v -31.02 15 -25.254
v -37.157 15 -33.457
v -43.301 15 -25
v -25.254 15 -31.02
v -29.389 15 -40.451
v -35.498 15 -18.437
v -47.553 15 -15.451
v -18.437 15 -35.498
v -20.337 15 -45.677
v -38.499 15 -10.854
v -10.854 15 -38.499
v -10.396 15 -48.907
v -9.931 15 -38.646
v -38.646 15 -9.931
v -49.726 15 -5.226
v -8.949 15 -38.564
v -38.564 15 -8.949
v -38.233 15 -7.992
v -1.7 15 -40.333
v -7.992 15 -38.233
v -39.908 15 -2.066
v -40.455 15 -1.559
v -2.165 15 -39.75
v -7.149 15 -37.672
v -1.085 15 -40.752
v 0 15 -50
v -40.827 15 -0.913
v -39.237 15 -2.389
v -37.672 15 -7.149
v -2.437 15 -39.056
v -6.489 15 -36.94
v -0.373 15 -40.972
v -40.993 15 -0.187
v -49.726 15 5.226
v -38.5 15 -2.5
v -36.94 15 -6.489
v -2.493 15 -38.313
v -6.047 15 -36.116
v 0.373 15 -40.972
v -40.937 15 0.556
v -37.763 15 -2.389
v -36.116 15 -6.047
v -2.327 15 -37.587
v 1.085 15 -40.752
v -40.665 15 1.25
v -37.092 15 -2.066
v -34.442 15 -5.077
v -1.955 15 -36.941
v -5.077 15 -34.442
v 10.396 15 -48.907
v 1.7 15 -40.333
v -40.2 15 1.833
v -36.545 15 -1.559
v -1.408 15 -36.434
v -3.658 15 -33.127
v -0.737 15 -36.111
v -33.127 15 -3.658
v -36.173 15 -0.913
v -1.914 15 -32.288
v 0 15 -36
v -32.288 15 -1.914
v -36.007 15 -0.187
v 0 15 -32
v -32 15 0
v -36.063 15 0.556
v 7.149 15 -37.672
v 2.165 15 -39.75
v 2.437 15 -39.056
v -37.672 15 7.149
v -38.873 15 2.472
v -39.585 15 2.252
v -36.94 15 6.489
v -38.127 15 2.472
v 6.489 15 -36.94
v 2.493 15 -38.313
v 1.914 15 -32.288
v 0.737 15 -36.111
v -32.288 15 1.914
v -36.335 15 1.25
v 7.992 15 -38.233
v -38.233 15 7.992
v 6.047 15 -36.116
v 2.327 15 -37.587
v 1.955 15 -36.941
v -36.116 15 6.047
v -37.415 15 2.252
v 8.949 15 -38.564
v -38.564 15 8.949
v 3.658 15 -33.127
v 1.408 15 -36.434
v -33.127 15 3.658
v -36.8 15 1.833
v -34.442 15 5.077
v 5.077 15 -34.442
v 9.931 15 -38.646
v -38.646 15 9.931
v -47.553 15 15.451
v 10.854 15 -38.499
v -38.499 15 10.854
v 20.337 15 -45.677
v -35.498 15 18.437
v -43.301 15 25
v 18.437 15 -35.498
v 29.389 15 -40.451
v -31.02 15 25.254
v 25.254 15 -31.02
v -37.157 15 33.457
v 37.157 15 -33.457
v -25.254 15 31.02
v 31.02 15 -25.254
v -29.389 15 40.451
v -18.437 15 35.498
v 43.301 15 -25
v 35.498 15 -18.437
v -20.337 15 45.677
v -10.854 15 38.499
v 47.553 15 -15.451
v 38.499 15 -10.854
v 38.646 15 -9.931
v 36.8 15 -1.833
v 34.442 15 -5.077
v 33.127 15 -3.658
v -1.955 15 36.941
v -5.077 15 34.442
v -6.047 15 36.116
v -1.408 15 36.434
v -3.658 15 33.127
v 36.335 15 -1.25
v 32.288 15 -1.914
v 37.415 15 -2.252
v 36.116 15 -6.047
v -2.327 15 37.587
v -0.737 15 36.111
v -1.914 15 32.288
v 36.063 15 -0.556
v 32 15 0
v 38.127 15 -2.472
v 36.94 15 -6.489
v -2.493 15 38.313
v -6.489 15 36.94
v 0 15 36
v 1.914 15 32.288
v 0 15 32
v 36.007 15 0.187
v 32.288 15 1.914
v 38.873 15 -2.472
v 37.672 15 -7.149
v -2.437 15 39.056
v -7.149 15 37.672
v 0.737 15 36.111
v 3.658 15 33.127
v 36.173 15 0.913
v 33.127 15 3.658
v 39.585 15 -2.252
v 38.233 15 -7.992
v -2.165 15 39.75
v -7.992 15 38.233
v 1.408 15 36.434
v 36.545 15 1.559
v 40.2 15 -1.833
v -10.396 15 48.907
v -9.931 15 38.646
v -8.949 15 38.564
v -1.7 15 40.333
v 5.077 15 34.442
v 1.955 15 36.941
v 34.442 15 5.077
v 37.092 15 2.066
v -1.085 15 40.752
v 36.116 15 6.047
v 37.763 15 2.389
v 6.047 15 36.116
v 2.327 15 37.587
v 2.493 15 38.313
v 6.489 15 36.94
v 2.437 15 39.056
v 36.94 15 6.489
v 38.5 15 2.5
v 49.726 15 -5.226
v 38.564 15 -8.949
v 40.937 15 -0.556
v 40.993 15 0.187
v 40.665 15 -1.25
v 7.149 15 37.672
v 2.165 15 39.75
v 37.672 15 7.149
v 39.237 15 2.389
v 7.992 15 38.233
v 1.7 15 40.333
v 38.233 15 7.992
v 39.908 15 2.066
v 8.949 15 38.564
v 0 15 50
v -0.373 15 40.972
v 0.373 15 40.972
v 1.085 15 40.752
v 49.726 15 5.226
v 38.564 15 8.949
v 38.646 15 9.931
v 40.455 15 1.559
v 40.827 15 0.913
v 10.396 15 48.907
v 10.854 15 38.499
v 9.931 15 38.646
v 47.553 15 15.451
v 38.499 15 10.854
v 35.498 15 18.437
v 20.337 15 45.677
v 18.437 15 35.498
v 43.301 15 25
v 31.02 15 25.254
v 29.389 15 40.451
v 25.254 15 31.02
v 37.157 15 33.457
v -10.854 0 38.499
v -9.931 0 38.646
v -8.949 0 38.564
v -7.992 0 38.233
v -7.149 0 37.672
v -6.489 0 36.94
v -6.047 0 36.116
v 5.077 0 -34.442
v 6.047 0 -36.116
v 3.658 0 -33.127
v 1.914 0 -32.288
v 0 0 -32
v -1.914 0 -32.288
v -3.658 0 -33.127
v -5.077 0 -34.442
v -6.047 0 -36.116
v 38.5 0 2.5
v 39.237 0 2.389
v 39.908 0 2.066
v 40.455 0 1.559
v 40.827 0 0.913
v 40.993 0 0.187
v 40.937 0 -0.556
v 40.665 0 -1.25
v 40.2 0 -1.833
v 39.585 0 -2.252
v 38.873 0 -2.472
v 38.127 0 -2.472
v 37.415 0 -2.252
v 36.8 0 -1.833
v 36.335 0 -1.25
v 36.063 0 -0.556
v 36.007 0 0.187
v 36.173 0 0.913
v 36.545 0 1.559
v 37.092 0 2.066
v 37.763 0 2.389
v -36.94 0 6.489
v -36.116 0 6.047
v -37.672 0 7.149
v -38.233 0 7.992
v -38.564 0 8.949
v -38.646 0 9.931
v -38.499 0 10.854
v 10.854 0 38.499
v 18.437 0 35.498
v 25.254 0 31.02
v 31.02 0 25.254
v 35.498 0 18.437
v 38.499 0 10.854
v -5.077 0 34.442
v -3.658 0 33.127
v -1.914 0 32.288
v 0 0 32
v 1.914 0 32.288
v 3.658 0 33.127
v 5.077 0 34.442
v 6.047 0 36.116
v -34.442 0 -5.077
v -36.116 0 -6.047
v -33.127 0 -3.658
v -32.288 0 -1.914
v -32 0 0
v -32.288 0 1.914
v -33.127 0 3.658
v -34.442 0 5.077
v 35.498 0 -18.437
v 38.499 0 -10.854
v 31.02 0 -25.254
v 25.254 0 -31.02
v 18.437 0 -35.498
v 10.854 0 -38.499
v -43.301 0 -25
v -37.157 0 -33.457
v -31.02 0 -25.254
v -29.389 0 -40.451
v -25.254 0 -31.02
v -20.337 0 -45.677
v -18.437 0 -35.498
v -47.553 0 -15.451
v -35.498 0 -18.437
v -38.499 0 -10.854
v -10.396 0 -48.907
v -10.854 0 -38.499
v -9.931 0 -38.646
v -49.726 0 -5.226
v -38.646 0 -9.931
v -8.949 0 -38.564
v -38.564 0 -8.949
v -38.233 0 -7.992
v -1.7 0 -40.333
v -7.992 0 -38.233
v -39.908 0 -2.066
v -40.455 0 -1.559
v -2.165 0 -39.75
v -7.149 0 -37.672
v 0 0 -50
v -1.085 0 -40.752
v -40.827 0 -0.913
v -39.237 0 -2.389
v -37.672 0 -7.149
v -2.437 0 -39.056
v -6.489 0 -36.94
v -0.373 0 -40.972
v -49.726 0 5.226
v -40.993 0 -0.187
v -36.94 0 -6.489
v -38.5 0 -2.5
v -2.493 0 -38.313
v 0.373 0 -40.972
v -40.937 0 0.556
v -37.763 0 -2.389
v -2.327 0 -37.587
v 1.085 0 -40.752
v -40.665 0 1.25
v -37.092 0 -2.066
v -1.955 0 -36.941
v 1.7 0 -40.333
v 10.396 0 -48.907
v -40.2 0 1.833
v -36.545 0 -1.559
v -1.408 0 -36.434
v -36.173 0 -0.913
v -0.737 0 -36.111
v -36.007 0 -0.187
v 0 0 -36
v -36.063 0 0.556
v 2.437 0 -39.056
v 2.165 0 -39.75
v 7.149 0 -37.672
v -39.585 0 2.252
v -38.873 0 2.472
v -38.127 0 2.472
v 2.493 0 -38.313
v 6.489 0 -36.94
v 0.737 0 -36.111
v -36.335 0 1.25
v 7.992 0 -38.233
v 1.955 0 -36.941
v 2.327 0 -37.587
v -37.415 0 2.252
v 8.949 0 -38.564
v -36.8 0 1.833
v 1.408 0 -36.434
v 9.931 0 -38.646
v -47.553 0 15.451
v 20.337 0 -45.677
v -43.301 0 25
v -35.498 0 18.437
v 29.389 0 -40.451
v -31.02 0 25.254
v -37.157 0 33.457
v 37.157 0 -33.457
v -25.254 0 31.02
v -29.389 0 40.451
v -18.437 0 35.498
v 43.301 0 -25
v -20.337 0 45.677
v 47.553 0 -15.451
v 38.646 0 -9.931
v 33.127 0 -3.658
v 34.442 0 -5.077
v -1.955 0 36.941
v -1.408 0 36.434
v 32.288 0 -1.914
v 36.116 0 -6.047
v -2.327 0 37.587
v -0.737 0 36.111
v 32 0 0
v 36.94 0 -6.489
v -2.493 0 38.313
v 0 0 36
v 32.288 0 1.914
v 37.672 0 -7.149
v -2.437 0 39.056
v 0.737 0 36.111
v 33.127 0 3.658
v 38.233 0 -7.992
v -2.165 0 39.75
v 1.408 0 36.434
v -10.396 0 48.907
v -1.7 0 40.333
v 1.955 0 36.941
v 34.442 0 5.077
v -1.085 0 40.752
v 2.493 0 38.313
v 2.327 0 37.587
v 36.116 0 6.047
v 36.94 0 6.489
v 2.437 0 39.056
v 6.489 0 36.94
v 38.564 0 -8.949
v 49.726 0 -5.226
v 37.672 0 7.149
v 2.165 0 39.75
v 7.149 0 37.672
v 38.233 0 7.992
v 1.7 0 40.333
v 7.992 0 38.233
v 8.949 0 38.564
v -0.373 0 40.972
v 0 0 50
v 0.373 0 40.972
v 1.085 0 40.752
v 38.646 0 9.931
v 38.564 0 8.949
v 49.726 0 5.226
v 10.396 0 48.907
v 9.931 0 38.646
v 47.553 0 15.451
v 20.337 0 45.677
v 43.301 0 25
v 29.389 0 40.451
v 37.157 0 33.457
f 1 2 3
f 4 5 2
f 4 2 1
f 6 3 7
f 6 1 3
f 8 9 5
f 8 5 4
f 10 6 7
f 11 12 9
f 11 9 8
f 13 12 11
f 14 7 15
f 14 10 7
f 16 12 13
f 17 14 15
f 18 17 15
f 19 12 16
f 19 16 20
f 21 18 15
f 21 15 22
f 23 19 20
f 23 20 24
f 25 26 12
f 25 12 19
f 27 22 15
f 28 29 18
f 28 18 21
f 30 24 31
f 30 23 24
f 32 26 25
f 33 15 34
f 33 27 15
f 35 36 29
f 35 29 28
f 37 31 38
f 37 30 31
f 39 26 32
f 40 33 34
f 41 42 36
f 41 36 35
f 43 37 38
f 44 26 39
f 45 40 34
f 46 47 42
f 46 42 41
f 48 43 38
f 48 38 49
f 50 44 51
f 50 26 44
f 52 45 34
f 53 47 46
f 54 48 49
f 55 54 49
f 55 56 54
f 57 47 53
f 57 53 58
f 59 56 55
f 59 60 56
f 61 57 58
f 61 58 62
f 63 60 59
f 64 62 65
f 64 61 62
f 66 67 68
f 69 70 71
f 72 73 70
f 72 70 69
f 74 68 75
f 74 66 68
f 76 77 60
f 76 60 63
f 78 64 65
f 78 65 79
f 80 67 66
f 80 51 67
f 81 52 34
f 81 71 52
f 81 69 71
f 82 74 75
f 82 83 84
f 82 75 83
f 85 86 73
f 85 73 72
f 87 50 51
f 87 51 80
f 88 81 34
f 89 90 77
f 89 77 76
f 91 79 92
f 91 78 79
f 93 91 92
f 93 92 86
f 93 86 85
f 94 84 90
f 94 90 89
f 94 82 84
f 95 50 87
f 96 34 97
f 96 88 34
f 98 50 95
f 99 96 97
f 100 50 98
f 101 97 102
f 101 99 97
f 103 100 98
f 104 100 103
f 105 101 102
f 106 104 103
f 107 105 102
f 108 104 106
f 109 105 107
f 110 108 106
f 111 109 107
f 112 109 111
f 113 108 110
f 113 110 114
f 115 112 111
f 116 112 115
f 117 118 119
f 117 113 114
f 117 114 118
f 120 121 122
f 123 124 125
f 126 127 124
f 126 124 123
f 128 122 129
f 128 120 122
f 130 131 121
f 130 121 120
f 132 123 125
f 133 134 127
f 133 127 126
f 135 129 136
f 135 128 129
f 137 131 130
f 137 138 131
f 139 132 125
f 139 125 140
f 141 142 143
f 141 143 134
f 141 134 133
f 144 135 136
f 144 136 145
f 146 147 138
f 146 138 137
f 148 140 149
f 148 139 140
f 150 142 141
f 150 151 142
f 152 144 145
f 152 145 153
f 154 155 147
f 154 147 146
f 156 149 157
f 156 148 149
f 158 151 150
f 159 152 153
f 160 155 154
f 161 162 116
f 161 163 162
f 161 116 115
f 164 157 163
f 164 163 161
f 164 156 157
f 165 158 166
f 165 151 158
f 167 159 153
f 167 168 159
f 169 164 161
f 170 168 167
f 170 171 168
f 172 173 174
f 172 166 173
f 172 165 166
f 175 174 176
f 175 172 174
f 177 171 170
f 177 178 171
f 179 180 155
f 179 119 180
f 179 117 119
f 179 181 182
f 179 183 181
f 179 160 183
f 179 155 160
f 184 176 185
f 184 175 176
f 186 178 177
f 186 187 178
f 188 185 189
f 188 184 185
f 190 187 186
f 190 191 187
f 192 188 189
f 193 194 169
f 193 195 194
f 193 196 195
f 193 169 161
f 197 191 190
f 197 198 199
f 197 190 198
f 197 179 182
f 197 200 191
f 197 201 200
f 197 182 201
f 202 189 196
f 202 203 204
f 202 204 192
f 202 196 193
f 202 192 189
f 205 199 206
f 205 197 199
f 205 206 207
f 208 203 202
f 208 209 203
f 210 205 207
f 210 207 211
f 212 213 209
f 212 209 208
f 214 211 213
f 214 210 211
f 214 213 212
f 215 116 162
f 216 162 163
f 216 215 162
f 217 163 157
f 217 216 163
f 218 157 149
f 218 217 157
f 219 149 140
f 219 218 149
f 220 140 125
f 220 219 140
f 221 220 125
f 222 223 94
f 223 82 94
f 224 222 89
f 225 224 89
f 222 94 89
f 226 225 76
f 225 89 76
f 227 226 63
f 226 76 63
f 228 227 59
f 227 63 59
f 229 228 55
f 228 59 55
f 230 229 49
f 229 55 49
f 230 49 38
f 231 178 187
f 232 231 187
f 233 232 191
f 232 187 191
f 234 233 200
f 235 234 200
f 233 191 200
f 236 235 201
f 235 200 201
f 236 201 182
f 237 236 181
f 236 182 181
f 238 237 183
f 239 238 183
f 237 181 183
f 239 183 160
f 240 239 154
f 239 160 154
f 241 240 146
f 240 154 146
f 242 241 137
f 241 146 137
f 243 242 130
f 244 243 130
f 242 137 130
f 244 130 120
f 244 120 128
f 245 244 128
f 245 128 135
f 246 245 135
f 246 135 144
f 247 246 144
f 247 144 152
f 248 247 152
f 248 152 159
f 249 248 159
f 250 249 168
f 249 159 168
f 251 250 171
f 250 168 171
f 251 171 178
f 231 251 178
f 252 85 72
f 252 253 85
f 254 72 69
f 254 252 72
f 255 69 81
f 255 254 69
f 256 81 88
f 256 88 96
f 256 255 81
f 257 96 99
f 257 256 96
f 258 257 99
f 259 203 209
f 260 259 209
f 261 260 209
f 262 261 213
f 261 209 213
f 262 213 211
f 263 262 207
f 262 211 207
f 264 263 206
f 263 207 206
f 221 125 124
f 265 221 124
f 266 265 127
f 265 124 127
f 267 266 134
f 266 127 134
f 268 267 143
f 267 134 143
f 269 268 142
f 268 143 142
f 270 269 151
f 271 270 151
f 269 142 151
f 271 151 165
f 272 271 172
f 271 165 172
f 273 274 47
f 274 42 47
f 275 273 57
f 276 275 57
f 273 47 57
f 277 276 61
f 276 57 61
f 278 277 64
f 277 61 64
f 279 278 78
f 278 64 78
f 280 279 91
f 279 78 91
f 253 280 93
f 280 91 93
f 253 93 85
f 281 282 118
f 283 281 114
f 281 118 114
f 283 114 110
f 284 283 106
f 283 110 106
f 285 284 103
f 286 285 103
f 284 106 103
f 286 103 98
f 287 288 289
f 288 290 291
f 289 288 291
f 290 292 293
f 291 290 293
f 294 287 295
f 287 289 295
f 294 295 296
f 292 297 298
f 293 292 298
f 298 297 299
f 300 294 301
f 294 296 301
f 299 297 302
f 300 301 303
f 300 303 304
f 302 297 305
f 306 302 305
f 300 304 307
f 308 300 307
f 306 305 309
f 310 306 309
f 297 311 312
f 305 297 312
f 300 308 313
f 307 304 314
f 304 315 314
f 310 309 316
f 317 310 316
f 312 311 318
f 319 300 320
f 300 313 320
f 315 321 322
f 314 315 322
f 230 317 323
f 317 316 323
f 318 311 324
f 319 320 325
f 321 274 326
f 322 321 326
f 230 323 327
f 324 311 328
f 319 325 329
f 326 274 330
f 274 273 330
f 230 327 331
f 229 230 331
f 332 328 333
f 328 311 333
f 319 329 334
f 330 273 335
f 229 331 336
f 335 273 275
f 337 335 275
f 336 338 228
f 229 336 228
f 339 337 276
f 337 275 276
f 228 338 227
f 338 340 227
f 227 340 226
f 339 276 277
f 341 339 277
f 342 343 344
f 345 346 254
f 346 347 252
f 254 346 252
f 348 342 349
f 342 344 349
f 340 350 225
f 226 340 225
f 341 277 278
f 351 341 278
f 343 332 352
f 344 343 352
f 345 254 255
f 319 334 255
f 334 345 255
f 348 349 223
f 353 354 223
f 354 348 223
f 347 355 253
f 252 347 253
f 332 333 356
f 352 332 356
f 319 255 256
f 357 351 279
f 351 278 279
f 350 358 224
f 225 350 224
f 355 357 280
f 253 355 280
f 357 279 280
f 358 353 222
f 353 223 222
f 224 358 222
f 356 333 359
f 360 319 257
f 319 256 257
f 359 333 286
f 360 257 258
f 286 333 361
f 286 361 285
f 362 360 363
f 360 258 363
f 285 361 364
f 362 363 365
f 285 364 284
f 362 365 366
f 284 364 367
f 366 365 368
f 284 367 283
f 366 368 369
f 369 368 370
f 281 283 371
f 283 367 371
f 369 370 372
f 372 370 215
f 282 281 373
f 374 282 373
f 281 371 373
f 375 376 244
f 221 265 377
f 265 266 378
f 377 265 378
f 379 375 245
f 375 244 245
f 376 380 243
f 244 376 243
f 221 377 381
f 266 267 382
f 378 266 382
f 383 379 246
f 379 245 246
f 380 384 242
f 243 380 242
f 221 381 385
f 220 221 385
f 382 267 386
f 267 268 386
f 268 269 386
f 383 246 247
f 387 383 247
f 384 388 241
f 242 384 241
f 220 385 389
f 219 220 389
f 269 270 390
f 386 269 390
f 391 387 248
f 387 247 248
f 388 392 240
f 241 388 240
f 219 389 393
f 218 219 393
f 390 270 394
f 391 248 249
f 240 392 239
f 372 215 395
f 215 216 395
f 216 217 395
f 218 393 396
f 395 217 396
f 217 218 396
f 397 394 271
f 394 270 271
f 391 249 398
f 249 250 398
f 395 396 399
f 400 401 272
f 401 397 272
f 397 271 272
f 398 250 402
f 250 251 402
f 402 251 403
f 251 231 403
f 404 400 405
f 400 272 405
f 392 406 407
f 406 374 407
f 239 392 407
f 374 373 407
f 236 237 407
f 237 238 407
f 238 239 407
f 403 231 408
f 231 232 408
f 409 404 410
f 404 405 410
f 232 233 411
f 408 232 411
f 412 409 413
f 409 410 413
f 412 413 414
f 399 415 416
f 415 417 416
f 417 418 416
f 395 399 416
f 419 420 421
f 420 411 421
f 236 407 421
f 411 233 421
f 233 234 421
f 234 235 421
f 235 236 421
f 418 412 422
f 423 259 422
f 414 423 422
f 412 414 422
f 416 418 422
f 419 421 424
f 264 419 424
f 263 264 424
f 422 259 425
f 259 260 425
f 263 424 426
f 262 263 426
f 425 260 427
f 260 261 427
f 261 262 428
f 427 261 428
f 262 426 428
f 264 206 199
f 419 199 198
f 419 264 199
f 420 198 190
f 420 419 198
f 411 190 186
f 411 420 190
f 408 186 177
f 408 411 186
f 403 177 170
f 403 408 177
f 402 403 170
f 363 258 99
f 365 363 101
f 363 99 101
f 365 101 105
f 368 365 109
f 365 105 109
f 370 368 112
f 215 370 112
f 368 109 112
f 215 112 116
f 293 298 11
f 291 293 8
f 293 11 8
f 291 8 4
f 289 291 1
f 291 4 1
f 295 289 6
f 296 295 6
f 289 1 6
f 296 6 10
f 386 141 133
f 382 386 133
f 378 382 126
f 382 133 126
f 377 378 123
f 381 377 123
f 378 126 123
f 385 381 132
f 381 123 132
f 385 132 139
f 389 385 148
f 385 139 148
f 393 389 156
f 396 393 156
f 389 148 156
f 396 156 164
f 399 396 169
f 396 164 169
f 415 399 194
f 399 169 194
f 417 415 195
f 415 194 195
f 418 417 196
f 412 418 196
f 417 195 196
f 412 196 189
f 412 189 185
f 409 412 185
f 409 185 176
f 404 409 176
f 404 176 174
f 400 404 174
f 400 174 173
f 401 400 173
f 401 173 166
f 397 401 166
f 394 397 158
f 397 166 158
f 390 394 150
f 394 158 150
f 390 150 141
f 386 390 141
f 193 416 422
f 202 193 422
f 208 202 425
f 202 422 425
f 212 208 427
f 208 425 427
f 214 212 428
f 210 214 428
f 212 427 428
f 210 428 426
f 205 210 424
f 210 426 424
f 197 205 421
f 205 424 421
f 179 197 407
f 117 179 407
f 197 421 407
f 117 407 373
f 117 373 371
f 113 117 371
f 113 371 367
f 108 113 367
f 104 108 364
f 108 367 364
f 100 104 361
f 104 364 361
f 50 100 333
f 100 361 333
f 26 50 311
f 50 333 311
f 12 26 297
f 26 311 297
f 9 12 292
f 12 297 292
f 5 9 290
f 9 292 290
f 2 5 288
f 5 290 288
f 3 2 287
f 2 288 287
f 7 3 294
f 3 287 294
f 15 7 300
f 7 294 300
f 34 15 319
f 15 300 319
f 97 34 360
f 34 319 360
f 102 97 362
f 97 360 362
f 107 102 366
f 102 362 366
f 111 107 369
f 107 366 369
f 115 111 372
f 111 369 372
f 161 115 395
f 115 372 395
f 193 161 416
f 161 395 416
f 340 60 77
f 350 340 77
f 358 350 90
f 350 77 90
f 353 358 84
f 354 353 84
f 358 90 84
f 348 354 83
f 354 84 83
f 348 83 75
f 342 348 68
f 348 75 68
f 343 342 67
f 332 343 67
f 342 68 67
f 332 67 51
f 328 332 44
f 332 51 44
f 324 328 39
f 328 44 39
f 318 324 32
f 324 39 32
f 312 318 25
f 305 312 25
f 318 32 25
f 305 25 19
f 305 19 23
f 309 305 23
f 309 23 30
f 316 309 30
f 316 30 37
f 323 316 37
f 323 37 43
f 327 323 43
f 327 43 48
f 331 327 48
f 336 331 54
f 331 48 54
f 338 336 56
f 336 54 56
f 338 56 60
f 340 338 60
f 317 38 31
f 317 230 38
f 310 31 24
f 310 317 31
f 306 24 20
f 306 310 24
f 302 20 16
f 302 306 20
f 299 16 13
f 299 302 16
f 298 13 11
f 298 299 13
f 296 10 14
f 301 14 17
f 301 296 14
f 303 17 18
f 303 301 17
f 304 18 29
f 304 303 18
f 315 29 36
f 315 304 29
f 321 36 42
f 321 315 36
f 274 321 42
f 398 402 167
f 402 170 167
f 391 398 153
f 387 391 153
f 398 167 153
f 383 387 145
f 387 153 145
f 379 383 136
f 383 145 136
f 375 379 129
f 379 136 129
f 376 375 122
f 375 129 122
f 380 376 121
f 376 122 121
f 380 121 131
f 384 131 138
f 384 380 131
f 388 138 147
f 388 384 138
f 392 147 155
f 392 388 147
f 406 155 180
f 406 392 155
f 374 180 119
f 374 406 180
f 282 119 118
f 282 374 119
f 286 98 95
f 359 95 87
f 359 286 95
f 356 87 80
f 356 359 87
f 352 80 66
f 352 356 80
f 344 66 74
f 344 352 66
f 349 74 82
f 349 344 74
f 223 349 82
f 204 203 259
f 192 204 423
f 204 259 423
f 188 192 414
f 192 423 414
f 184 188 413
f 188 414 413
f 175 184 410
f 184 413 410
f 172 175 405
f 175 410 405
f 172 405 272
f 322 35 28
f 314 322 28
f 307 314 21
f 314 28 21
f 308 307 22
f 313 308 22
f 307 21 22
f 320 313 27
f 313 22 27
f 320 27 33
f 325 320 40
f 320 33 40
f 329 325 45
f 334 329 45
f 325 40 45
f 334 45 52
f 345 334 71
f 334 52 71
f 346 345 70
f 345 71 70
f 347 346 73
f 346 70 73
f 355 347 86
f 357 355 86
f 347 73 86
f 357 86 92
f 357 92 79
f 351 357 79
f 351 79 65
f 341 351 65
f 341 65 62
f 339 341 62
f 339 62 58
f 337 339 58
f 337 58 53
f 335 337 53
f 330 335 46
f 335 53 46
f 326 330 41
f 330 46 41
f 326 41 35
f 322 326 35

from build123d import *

# Parameters (mm, degrees)
SKETCH_1_R          = 50
SKETCH_1_R_2        = 32
EXTRUDE_1_DEPTH     = 15
SKETCH_2_R          = 2.5
CUT_EXTRUDE_1_DEPTH = 15
SKETCH_3_R          = 30
CUT_EXTRUDE_2_DEPTH = 15
FILLET_1_R          = 4


with BuildPart() as part:
    # 草图1 → 凸台-拉伸1 (new body)
    with BuildSketch(Plane(origin=(0, 0, 0), x_dir=(1, 0, 0), z_dir=(0, 1, 0))):
        with Locations(Location((0, 0, 0), (0, 0, 270))):
            Circle(SKETCH_1_R)
        with Locations(Location((0, 0, 0), (0, 0, 270))):
            Circle(SKETCH_1_R_2, mode=Mode.SUBTRACT)
    extrude(amount=EXTRUDE_1_DEPTH)

    # 草图2 → 切除-拉伸1 (cut)
    with BuildSketch(Plane(origin=(0, 15, 0), x_dir=(1, 0, 0), z_dir=(0, 1, 0))):
        with Locations(Location((38.5, 0, 0), (0, 0, 270))):
            Circle(SKETCH_2_R)
        with Locations(Location((-38.5, 0, 0), (0, 0, 90))):
            Circle(SKETCH_2_R)
        with Locations(Location((0, 38.5, 0), (0, 0, 270))):
            Circle(SKETCH_2_R)
        with Locations(Location((0, -38.5, 0), (0, 0, 90))):
            Circle(SKETCH_2_R)
    extrude(amount=-CUT_EXTRUDE_1_DEPTH, mode=Mode.SUBTRACT)

    # 草图3 → 切除-拉伸2 (cut)
    with BuildSketch(Plane(origin=(0, 15, 0), x_dir=(1, 0, 0), z_dir=(0, 1, 0))):
        with BuildLine():
            ThreePointArc((-39.480519481, -6.425619157), (-28.284271247, -28.284271247), (-6.425619157, -39.480519481))
            ThreePointArc((-6.425619157, -39.480519481), (0, -32), (6.425619157, -39.480519481))
            ThreePointArc((6.425619157, -39.480519481), (28.284271247, -28.284271247), (39.480519481, -6.425619157))
            ThreePointArc((39.480519481, -6.425619157), (32, 0), (39.480519481, 6.425619157))
            ThreePointArc((39.480519481, 6.425619157), (28.284271247, 28.284271247), (6.425619157, 39.480519481))
            ThreePointArc((6.425619157, 39.480519481), (0, 32), (-6.425619157, 39.480519481))
            ThreePointArc((-6.425619157, 39.480519481), (-28.284271247, 28.284271247), (-39.480519481, 6.425619157))
            ThreePointArc((-39.480519481, 6.425619157), (-32, 0), (-39.480519481, -6.425619157))
        make_face()
        Circle(SKETCH_3_R, mode=Mode.SUBTRACT)
    extrude(amount=-CUT_EXTRUDE_2_DEPTH, mode=Mode.SUBTRACT)

    # 圆角1
    fillet_1_edges = [part.edges().sort_by_distance(p)[0] for p in [
        (39.480519481, 7.5, 6.425619157),
        (6.425619157, 7.5, 39.480519481),
        (-6.425619157, 7.5, 39.480519481),
        (-39.480519481, 7.5, 6.425619157),
        (-39.480519481, 7.5, -6.425619157),
        (-6.425619157, 7.5, -39.480519481),
        (6.425619157, 7.5, -39.480519481),
        (39.480519481, 7.5, -6.425619157),
    ]]
    fillet(fillet_1_edges, radius=FILLET_1_R)


solid = part.part
